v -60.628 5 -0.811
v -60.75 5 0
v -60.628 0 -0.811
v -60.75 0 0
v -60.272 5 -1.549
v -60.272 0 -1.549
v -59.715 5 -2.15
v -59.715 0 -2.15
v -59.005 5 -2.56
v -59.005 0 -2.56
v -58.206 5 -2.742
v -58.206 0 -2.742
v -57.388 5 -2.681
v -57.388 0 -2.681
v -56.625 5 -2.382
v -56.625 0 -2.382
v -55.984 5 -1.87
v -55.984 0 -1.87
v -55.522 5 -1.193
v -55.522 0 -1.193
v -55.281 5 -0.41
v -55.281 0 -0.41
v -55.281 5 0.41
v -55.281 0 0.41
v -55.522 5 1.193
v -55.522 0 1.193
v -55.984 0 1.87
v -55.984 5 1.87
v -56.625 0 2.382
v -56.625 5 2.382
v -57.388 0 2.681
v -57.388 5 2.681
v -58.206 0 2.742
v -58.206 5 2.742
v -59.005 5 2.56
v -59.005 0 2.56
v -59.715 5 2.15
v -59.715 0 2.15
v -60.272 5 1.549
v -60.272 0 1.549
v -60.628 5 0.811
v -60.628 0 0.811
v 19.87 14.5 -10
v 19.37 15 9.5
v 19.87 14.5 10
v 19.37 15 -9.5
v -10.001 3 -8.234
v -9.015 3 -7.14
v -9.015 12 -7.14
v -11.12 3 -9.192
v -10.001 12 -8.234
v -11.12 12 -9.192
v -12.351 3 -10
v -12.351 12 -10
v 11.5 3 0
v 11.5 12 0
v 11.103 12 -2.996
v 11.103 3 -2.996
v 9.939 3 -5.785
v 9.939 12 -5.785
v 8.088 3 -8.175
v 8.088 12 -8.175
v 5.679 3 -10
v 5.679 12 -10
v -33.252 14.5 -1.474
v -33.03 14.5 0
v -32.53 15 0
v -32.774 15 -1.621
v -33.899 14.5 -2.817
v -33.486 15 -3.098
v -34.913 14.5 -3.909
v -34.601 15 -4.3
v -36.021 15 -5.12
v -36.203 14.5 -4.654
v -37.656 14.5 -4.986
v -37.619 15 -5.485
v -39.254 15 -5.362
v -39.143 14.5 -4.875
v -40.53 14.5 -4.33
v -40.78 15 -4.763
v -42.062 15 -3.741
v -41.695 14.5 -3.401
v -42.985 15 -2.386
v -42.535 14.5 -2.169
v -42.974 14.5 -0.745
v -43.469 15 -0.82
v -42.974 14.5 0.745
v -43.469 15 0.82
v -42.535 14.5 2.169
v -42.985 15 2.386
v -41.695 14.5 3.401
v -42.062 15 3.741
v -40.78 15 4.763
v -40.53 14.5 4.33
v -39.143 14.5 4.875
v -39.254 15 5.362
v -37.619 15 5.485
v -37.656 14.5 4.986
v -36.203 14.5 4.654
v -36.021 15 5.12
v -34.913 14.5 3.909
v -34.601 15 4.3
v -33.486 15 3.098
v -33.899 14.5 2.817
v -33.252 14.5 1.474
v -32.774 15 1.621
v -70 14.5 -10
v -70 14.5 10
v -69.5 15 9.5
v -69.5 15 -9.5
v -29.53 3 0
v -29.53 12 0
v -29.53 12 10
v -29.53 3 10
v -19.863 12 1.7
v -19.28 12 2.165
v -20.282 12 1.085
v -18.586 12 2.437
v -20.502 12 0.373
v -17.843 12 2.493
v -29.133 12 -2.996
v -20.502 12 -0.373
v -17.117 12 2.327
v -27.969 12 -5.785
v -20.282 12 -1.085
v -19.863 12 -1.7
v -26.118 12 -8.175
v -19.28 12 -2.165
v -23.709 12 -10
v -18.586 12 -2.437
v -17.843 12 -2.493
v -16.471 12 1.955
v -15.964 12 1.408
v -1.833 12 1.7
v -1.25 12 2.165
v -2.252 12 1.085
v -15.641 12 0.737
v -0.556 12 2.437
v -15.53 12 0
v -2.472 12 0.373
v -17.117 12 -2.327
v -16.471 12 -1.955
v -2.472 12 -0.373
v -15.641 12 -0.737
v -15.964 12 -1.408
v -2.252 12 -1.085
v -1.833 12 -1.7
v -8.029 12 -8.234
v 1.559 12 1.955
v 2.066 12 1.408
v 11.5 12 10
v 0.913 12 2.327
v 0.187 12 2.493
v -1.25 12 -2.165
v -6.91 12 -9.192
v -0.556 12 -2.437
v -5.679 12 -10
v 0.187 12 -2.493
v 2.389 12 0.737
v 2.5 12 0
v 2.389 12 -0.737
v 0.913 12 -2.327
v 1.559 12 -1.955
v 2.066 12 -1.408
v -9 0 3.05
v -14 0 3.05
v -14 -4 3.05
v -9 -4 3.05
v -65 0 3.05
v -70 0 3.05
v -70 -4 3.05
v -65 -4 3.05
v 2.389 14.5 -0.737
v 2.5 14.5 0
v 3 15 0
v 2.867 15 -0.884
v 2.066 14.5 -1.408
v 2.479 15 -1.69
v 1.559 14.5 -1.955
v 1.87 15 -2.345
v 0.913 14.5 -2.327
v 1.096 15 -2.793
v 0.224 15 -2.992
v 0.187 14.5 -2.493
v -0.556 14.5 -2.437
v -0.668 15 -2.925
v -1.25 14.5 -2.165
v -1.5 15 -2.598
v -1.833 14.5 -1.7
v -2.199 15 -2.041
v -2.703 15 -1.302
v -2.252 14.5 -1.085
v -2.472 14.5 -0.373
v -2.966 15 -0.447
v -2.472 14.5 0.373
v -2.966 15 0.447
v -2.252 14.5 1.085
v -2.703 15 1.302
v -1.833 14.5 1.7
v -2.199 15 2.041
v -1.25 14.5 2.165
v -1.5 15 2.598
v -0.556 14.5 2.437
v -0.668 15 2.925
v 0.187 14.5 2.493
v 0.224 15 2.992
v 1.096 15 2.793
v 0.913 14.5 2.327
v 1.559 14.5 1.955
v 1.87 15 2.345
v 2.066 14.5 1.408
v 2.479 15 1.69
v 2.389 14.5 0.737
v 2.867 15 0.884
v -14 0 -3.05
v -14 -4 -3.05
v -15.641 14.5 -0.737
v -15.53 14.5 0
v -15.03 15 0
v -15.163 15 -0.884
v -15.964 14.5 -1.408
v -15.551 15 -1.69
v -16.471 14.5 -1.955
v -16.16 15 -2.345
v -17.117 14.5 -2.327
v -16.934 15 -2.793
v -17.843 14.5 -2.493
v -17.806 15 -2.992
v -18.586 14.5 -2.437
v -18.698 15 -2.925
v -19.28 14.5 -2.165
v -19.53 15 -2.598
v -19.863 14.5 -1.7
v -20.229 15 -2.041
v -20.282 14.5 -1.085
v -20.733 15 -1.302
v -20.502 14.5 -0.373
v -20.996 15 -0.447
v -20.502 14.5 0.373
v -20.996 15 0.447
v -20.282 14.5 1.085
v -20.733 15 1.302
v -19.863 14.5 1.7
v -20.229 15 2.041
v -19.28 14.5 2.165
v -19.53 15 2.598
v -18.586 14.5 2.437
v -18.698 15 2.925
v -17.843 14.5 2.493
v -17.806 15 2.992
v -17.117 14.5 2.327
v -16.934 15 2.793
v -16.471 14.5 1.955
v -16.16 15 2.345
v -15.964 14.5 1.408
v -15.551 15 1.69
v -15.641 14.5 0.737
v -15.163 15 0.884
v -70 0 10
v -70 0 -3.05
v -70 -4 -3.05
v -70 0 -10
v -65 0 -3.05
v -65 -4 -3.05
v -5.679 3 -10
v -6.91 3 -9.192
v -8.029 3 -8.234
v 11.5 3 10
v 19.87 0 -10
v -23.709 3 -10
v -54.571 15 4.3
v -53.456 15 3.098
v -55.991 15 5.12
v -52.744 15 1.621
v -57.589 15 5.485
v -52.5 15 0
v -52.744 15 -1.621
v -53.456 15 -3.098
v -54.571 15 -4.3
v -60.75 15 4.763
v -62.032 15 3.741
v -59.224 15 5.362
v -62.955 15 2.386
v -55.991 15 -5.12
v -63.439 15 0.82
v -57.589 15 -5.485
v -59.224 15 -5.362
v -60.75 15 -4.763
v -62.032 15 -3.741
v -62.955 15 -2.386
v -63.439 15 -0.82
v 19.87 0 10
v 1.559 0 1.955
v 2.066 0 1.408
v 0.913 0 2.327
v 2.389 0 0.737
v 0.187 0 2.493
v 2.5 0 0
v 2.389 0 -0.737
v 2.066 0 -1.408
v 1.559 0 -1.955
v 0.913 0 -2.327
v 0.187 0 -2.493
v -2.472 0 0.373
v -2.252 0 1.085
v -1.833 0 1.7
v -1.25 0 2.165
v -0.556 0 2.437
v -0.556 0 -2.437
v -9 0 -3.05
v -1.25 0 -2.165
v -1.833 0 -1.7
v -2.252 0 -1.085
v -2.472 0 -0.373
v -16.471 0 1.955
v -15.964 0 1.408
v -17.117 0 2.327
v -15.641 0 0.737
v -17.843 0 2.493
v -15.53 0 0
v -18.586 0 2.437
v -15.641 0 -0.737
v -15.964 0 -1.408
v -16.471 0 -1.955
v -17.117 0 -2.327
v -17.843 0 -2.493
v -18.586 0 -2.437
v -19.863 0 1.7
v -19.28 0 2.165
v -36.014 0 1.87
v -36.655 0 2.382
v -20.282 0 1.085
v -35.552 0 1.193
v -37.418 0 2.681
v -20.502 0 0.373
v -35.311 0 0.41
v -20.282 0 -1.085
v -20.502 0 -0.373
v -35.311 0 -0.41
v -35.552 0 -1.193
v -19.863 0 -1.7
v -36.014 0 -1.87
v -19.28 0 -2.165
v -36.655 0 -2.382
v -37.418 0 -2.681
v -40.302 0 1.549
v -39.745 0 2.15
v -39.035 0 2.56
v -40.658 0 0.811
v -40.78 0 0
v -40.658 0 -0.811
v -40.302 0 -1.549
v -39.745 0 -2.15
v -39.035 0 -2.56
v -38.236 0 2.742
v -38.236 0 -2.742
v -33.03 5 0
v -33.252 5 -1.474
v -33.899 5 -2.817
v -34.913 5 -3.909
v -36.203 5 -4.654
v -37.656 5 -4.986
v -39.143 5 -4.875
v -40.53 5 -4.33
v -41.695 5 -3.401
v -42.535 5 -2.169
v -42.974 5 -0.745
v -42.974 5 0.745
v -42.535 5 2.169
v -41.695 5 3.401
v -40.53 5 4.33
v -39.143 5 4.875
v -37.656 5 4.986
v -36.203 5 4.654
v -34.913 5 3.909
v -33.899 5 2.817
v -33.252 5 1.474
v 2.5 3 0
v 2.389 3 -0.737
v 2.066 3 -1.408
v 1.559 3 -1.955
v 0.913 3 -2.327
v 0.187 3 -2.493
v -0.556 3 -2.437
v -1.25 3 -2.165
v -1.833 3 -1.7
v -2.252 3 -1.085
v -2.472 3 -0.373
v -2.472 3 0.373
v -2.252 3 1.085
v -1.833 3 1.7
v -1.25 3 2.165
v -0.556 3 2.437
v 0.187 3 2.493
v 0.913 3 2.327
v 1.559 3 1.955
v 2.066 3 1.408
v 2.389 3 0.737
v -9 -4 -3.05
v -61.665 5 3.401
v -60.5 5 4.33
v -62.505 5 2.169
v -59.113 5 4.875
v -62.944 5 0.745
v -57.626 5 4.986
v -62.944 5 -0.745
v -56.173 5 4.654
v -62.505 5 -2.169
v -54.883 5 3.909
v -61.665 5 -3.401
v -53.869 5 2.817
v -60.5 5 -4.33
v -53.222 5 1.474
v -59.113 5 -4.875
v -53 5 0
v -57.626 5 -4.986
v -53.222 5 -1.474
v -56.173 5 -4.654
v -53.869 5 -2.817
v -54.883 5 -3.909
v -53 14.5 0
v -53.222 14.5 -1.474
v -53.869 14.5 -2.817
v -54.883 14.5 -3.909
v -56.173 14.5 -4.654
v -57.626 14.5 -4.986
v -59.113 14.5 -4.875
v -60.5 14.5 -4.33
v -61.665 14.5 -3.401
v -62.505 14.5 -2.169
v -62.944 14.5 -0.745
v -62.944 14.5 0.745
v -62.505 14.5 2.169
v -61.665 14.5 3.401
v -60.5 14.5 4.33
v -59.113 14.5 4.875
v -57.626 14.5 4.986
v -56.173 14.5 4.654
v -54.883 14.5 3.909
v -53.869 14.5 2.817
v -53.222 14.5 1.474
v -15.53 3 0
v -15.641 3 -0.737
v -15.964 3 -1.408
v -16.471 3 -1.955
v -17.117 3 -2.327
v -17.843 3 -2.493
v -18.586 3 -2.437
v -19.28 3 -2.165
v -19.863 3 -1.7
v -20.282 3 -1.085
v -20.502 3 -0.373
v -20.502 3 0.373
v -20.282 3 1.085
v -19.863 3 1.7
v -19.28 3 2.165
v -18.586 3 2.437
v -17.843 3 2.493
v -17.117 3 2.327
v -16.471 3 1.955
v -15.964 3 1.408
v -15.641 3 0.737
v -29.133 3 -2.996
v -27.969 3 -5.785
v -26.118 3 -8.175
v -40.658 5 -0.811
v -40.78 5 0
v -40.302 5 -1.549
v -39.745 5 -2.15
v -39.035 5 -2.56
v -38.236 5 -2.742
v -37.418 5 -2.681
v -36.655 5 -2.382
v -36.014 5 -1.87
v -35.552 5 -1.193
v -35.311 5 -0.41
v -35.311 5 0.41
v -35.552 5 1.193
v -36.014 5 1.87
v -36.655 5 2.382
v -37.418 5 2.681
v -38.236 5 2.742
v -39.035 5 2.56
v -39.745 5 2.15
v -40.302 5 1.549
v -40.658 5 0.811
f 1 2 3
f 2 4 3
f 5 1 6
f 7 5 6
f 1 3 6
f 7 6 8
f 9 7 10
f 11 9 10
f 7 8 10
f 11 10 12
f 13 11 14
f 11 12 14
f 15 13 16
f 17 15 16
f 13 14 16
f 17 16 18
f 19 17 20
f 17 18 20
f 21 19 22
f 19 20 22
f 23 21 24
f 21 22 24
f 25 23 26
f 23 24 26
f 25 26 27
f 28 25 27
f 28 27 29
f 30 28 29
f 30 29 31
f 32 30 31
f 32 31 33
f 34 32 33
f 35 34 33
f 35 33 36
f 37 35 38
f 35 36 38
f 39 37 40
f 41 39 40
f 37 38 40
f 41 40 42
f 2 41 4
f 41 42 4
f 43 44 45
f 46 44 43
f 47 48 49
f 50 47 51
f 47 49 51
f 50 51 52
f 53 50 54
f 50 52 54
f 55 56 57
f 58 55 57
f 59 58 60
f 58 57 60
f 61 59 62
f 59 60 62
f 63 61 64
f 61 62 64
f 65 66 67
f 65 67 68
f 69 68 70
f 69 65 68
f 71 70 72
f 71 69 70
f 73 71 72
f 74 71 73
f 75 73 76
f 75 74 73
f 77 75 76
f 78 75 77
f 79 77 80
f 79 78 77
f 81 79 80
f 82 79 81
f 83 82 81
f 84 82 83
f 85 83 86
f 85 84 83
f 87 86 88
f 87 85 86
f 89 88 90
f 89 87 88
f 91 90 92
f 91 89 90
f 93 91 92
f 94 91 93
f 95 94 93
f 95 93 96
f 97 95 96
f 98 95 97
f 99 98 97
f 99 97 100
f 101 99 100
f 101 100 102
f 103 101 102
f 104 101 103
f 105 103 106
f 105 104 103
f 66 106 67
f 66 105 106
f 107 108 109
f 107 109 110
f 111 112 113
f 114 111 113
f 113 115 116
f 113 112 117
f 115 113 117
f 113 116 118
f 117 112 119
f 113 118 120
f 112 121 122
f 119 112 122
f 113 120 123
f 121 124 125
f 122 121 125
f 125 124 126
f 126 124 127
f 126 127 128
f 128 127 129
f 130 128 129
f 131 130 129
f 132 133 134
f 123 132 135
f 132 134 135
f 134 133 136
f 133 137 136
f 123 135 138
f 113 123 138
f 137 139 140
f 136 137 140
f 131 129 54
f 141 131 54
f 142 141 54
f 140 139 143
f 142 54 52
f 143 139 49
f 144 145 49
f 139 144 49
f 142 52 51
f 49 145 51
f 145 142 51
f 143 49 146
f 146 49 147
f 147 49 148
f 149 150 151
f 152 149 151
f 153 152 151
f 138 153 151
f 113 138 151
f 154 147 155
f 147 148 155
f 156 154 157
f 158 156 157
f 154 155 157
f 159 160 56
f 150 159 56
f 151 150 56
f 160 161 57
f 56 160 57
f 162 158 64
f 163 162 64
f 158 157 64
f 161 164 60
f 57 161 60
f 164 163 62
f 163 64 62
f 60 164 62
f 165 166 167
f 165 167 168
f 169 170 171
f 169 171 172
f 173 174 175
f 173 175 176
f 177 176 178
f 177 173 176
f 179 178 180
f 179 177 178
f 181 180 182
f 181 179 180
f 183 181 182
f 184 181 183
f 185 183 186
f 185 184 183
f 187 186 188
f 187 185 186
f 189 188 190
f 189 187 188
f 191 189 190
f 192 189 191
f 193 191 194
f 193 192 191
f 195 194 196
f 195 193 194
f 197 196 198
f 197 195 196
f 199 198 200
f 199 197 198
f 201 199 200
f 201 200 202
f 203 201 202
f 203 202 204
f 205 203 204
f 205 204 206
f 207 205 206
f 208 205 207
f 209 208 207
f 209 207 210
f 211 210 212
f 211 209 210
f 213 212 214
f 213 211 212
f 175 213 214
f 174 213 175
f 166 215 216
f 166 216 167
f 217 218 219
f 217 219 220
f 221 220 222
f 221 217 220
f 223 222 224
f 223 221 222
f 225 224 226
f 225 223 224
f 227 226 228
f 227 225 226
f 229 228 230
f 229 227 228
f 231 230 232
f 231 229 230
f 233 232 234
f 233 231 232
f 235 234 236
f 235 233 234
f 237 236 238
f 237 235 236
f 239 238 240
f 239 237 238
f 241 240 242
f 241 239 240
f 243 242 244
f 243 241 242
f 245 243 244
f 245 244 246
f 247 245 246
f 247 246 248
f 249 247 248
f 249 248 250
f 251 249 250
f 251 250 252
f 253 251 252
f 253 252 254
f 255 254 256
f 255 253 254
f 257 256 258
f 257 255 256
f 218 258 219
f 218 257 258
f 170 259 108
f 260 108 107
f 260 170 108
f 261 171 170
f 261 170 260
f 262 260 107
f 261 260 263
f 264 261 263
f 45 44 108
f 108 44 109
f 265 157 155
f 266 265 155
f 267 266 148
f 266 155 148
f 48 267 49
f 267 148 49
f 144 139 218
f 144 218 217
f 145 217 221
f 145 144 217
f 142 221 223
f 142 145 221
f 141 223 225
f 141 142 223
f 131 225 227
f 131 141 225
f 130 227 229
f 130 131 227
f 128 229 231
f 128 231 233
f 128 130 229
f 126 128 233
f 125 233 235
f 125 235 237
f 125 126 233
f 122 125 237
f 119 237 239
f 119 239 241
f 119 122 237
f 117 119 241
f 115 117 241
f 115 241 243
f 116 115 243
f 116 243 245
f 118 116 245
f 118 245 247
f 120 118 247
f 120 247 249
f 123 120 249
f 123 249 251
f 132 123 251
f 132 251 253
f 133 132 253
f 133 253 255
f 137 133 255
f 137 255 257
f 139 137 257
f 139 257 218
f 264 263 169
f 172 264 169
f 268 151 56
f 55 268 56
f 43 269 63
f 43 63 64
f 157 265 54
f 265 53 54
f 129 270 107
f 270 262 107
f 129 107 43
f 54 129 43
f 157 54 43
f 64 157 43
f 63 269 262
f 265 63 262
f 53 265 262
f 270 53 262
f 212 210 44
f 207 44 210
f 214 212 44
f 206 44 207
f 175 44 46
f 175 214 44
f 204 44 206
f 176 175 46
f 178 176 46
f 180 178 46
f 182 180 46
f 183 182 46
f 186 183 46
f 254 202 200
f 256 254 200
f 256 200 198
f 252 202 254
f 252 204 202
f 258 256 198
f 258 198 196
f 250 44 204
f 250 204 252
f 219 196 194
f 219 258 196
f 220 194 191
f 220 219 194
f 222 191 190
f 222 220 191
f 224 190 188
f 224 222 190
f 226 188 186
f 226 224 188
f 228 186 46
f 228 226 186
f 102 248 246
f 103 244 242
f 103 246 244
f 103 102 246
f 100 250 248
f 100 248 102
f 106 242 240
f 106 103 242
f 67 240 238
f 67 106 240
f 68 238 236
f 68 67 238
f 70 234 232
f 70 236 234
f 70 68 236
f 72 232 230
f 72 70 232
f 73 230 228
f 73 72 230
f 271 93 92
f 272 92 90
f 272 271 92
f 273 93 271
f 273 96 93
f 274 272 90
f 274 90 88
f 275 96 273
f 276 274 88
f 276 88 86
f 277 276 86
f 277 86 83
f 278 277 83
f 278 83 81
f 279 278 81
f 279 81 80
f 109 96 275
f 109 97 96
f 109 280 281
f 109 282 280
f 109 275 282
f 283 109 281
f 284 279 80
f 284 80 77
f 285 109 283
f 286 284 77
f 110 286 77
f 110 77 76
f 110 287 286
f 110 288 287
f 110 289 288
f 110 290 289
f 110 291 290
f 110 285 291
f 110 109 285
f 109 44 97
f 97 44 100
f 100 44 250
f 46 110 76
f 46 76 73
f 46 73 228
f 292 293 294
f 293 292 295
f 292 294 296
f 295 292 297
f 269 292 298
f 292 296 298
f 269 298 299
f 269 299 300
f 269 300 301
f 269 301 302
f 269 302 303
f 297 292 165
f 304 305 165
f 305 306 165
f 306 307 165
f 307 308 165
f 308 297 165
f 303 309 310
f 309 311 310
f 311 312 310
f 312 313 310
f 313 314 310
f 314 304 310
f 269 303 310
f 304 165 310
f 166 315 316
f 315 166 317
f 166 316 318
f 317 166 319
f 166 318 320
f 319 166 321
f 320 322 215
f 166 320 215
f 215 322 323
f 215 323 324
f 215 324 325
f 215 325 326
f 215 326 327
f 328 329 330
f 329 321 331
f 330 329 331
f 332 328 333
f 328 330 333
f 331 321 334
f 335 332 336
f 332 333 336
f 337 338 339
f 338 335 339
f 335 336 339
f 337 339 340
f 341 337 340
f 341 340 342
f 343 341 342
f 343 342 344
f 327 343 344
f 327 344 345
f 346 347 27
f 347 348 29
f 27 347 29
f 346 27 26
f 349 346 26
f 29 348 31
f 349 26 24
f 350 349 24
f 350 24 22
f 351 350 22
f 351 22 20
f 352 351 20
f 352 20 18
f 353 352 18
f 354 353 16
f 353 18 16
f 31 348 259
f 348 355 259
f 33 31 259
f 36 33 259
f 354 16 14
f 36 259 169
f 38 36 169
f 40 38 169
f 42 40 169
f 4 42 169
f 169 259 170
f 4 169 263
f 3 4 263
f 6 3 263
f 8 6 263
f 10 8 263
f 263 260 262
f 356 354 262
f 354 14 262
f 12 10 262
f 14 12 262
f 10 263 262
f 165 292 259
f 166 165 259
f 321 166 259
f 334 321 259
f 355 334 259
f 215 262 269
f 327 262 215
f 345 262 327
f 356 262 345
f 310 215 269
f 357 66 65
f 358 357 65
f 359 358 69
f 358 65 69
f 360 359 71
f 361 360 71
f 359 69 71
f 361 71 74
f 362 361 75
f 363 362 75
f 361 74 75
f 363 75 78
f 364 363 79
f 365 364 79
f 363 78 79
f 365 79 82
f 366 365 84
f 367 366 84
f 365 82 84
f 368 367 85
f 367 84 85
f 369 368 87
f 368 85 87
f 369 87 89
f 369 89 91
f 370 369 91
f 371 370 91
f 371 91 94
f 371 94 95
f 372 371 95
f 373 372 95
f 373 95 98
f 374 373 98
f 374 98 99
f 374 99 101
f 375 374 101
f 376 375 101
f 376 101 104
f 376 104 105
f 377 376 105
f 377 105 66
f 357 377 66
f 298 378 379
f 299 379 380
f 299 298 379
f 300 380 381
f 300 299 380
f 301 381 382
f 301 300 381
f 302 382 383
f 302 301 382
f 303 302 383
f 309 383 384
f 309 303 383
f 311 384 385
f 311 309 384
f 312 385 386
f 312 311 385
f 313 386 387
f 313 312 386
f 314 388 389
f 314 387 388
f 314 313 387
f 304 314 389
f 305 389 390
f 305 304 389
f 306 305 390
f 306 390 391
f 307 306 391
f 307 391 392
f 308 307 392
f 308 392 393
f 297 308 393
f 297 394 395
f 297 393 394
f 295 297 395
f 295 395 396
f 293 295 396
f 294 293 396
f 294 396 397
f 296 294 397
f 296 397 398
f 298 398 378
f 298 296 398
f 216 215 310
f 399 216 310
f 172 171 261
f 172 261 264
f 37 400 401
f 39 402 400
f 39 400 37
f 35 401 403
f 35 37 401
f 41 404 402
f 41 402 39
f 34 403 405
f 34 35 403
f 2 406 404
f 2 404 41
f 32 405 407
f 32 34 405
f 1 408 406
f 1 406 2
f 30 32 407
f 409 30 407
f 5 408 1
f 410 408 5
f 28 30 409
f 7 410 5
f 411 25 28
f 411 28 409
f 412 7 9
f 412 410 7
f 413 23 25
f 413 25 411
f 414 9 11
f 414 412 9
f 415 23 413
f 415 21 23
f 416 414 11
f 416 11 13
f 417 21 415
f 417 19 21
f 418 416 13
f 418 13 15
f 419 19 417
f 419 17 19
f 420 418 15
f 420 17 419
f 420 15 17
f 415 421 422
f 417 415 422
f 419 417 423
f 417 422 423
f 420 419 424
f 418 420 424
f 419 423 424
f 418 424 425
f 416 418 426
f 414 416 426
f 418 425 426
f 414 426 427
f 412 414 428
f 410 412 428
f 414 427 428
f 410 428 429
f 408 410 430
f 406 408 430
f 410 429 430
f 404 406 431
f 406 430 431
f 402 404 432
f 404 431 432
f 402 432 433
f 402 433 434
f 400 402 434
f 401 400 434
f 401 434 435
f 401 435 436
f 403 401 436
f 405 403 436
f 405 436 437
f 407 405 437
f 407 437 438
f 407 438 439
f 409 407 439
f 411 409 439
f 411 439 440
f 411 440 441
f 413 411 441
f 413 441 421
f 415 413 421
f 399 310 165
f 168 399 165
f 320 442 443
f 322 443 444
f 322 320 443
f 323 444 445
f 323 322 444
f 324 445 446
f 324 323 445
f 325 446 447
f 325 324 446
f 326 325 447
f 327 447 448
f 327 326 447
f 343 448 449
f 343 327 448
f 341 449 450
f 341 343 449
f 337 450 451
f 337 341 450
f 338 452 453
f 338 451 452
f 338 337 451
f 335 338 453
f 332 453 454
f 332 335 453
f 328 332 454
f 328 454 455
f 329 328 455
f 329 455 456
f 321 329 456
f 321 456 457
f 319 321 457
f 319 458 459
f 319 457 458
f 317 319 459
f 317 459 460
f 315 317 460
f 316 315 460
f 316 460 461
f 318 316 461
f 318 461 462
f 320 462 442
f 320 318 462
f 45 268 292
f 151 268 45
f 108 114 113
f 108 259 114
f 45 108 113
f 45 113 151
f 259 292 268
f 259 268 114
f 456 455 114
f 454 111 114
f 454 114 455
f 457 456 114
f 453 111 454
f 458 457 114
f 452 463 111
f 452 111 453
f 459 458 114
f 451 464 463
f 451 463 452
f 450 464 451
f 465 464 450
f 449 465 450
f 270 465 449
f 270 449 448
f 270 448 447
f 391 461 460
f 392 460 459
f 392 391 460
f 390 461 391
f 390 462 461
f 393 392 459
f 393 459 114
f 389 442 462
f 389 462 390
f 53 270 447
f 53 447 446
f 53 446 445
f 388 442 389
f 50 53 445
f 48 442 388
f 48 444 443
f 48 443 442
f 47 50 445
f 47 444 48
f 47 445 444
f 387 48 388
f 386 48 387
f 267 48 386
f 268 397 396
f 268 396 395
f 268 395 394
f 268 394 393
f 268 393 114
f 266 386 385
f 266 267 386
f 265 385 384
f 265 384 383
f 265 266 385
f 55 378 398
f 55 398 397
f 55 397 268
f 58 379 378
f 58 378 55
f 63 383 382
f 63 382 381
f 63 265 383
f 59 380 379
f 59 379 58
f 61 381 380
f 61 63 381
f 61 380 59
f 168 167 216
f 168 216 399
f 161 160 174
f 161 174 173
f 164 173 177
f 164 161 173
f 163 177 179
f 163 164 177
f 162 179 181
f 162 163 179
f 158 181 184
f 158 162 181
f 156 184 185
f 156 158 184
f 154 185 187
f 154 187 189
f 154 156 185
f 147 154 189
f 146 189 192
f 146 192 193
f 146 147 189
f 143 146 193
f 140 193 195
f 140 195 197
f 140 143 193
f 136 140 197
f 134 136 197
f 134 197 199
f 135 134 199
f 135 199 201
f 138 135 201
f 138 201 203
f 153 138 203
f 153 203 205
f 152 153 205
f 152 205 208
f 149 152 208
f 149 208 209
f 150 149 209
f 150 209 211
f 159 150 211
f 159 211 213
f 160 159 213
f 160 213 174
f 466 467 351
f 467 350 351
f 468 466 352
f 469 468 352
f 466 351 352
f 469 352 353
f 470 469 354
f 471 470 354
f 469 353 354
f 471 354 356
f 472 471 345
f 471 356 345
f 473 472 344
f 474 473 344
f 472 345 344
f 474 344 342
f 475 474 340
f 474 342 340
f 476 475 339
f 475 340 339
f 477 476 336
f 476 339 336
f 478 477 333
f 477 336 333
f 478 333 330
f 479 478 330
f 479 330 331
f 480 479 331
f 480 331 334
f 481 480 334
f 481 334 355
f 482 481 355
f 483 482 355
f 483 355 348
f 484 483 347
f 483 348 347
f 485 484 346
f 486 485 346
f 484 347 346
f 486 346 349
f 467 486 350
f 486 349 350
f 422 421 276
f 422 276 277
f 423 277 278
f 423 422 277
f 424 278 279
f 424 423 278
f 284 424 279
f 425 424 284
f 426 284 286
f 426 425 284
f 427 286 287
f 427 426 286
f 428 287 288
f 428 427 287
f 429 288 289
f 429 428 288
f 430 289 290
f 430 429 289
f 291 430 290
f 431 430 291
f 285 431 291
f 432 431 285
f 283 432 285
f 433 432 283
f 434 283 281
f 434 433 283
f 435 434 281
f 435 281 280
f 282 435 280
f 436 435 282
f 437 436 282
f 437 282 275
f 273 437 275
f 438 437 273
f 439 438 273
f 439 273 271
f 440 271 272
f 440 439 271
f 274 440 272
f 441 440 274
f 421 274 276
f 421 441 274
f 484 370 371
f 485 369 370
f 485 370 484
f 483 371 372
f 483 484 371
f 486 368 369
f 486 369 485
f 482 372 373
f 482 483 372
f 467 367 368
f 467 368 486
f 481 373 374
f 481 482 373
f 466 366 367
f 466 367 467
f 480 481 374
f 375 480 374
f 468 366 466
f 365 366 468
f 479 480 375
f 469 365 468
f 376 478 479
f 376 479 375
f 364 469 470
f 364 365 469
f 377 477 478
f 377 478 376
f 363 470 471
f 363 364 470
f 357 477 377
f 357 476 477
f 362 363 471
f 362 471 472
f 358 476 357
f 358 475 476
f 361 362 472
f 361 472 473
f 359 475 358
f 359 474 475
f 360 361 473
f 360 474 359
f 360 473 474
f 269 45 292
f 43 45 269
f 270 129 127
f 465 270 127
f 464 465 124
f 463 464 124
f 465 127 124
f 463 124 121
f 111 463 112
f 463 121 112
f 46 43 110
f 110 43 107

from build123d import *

# Parameters (mm, degrees)
SKETCH1_W                      = 81.37
SKETCH1_H                      = 20
SKETCH1_R                      = 2.5
BOSS_EXTRUDE1_DEPTH            = 15
CBORE_FOR_M5_SHCS1_D           = 5.5
CBORE_FOR_M5_SHCS1_CBORE_D     = 10
CBORE_FOR_M5_SHCS1_CBORE_DEPTH = 10
SKETCH8_W                      = 20
SKETCH8_H                      = 15
BOSS_EXTRUDE3_DEPTH            = 8.5
CUT_EXTRUDE1_START             = -3
CUT_EXTRUDE1_DEPTH             = 9
SKETCH7_W                      = 5
SKETCH7_H                      = 6.1
BOSS_EXTRUDE2_DEPTH            = 4
CHAMFER1_SIZE                  = 0.5


with BuildPart() as part:
    # Sketch1 → Boss-Extrude1 (new body)
    with BuildSketch(Plane(origin=(0, 0, 0), x_dir=(1, 0, 0), z_dir=(0, 1, 0))):
        with Locations((-29.315, 0)):
            Rectangle(SKETCH1_W, SKETCH1_H)
        Circle(SKETCH1_R, mode=Mode.SUBTRACT)
        with Locations((-18.03, 0)):
            Circle(SKETCH1_R, mode=Mode.SUBTRACT)
    extrude(amount=BOSS_EXTRUDE1_DEPTH)

    # CBORE for M5 SHCS1 (through all)
    with Locations(Plane(origin=(0, 15, 0), x_dir=(1, 0, 0), z_dir=(0, 1, 0))):
        with Locations((-58, 0), (-38.03, 0)):
            CounterBoreHole(CBORE_FOR_M5_SHCS1_D / 2, CBORE_FOR_M5_SHCS1_CBORE_D / 2, CBORE_FOR_M5_SHCS1_CBORE_DEPTH)

    # Sketch8 → Boss-Extrude3 (add)
    with BuildSketch(Plane(origin=(11.37, 0, 0), x_dir=(0, 0, -1), z_dir=(1, 0, 0))):
        with Locations((0, 7.5)):
            Rectangle(SKETCH8_W, SKETCH8_H)
    extrude(amount=BOSS_EXTRUDE3_DEPTH)

    # Sketch6 → Cut-Extrude1 (cut)
    with BuildSketch(Plane(origin=(0, 15, 0), x_dir=(1, 0, 0), z_dir=(0, 1, 0)).offset(CUT_EXTRUDE1_START)):
        with BuildLine():
            Line((-29.53, 0), (-29.53, -10))
            Line((-29.53, -10), (11.5, -10))
            Line((11.5, -10), (11.5, 0))
            ThreePointArc((11.5, 0), (3.780046296, 10.860996731), (-9.015, 7.140012255))
            ThreePointArc((-9.015, 7.140012255), (-21.810046296, 10.860996731), (-29.53, 0))
        make_face()
    extrude(amount=-CUT_EXTRUDE1_DEPTH, mode=Mode.SUBTRACT)

    # Sketch7 → Boss-Extrude2 (add)
    with BuildSketch(Plane.XZ):
        with Locations((-11.5, 0)):
            Rectangle(SKETCH7_W, SKETCH7_H)
        with Locations((-67.5, 0)):
            Rectangle(SKETCH7_W, SKETCH7_H)
    extrude(amount=BOSS_EXTRUDE2_DEPTH)

    # Chamfer1
    chamfer1_edges = [part.edges().sort_by_distance(p)[0] for p in [
        (-2.5, 15, 0),
        (-70, 15, 0),
        (-20.53, 15, 0),
        (-25.065, 15, 10),
        (-43.03, 15, 0),
        (-63, 15, 0),
        (19.87, 15, 0),
        (-25.065, 15, -10),
    ]]
    chamfer(chamfer1_edges, length=CHAMFER1_SIZE)


solid = part.part
